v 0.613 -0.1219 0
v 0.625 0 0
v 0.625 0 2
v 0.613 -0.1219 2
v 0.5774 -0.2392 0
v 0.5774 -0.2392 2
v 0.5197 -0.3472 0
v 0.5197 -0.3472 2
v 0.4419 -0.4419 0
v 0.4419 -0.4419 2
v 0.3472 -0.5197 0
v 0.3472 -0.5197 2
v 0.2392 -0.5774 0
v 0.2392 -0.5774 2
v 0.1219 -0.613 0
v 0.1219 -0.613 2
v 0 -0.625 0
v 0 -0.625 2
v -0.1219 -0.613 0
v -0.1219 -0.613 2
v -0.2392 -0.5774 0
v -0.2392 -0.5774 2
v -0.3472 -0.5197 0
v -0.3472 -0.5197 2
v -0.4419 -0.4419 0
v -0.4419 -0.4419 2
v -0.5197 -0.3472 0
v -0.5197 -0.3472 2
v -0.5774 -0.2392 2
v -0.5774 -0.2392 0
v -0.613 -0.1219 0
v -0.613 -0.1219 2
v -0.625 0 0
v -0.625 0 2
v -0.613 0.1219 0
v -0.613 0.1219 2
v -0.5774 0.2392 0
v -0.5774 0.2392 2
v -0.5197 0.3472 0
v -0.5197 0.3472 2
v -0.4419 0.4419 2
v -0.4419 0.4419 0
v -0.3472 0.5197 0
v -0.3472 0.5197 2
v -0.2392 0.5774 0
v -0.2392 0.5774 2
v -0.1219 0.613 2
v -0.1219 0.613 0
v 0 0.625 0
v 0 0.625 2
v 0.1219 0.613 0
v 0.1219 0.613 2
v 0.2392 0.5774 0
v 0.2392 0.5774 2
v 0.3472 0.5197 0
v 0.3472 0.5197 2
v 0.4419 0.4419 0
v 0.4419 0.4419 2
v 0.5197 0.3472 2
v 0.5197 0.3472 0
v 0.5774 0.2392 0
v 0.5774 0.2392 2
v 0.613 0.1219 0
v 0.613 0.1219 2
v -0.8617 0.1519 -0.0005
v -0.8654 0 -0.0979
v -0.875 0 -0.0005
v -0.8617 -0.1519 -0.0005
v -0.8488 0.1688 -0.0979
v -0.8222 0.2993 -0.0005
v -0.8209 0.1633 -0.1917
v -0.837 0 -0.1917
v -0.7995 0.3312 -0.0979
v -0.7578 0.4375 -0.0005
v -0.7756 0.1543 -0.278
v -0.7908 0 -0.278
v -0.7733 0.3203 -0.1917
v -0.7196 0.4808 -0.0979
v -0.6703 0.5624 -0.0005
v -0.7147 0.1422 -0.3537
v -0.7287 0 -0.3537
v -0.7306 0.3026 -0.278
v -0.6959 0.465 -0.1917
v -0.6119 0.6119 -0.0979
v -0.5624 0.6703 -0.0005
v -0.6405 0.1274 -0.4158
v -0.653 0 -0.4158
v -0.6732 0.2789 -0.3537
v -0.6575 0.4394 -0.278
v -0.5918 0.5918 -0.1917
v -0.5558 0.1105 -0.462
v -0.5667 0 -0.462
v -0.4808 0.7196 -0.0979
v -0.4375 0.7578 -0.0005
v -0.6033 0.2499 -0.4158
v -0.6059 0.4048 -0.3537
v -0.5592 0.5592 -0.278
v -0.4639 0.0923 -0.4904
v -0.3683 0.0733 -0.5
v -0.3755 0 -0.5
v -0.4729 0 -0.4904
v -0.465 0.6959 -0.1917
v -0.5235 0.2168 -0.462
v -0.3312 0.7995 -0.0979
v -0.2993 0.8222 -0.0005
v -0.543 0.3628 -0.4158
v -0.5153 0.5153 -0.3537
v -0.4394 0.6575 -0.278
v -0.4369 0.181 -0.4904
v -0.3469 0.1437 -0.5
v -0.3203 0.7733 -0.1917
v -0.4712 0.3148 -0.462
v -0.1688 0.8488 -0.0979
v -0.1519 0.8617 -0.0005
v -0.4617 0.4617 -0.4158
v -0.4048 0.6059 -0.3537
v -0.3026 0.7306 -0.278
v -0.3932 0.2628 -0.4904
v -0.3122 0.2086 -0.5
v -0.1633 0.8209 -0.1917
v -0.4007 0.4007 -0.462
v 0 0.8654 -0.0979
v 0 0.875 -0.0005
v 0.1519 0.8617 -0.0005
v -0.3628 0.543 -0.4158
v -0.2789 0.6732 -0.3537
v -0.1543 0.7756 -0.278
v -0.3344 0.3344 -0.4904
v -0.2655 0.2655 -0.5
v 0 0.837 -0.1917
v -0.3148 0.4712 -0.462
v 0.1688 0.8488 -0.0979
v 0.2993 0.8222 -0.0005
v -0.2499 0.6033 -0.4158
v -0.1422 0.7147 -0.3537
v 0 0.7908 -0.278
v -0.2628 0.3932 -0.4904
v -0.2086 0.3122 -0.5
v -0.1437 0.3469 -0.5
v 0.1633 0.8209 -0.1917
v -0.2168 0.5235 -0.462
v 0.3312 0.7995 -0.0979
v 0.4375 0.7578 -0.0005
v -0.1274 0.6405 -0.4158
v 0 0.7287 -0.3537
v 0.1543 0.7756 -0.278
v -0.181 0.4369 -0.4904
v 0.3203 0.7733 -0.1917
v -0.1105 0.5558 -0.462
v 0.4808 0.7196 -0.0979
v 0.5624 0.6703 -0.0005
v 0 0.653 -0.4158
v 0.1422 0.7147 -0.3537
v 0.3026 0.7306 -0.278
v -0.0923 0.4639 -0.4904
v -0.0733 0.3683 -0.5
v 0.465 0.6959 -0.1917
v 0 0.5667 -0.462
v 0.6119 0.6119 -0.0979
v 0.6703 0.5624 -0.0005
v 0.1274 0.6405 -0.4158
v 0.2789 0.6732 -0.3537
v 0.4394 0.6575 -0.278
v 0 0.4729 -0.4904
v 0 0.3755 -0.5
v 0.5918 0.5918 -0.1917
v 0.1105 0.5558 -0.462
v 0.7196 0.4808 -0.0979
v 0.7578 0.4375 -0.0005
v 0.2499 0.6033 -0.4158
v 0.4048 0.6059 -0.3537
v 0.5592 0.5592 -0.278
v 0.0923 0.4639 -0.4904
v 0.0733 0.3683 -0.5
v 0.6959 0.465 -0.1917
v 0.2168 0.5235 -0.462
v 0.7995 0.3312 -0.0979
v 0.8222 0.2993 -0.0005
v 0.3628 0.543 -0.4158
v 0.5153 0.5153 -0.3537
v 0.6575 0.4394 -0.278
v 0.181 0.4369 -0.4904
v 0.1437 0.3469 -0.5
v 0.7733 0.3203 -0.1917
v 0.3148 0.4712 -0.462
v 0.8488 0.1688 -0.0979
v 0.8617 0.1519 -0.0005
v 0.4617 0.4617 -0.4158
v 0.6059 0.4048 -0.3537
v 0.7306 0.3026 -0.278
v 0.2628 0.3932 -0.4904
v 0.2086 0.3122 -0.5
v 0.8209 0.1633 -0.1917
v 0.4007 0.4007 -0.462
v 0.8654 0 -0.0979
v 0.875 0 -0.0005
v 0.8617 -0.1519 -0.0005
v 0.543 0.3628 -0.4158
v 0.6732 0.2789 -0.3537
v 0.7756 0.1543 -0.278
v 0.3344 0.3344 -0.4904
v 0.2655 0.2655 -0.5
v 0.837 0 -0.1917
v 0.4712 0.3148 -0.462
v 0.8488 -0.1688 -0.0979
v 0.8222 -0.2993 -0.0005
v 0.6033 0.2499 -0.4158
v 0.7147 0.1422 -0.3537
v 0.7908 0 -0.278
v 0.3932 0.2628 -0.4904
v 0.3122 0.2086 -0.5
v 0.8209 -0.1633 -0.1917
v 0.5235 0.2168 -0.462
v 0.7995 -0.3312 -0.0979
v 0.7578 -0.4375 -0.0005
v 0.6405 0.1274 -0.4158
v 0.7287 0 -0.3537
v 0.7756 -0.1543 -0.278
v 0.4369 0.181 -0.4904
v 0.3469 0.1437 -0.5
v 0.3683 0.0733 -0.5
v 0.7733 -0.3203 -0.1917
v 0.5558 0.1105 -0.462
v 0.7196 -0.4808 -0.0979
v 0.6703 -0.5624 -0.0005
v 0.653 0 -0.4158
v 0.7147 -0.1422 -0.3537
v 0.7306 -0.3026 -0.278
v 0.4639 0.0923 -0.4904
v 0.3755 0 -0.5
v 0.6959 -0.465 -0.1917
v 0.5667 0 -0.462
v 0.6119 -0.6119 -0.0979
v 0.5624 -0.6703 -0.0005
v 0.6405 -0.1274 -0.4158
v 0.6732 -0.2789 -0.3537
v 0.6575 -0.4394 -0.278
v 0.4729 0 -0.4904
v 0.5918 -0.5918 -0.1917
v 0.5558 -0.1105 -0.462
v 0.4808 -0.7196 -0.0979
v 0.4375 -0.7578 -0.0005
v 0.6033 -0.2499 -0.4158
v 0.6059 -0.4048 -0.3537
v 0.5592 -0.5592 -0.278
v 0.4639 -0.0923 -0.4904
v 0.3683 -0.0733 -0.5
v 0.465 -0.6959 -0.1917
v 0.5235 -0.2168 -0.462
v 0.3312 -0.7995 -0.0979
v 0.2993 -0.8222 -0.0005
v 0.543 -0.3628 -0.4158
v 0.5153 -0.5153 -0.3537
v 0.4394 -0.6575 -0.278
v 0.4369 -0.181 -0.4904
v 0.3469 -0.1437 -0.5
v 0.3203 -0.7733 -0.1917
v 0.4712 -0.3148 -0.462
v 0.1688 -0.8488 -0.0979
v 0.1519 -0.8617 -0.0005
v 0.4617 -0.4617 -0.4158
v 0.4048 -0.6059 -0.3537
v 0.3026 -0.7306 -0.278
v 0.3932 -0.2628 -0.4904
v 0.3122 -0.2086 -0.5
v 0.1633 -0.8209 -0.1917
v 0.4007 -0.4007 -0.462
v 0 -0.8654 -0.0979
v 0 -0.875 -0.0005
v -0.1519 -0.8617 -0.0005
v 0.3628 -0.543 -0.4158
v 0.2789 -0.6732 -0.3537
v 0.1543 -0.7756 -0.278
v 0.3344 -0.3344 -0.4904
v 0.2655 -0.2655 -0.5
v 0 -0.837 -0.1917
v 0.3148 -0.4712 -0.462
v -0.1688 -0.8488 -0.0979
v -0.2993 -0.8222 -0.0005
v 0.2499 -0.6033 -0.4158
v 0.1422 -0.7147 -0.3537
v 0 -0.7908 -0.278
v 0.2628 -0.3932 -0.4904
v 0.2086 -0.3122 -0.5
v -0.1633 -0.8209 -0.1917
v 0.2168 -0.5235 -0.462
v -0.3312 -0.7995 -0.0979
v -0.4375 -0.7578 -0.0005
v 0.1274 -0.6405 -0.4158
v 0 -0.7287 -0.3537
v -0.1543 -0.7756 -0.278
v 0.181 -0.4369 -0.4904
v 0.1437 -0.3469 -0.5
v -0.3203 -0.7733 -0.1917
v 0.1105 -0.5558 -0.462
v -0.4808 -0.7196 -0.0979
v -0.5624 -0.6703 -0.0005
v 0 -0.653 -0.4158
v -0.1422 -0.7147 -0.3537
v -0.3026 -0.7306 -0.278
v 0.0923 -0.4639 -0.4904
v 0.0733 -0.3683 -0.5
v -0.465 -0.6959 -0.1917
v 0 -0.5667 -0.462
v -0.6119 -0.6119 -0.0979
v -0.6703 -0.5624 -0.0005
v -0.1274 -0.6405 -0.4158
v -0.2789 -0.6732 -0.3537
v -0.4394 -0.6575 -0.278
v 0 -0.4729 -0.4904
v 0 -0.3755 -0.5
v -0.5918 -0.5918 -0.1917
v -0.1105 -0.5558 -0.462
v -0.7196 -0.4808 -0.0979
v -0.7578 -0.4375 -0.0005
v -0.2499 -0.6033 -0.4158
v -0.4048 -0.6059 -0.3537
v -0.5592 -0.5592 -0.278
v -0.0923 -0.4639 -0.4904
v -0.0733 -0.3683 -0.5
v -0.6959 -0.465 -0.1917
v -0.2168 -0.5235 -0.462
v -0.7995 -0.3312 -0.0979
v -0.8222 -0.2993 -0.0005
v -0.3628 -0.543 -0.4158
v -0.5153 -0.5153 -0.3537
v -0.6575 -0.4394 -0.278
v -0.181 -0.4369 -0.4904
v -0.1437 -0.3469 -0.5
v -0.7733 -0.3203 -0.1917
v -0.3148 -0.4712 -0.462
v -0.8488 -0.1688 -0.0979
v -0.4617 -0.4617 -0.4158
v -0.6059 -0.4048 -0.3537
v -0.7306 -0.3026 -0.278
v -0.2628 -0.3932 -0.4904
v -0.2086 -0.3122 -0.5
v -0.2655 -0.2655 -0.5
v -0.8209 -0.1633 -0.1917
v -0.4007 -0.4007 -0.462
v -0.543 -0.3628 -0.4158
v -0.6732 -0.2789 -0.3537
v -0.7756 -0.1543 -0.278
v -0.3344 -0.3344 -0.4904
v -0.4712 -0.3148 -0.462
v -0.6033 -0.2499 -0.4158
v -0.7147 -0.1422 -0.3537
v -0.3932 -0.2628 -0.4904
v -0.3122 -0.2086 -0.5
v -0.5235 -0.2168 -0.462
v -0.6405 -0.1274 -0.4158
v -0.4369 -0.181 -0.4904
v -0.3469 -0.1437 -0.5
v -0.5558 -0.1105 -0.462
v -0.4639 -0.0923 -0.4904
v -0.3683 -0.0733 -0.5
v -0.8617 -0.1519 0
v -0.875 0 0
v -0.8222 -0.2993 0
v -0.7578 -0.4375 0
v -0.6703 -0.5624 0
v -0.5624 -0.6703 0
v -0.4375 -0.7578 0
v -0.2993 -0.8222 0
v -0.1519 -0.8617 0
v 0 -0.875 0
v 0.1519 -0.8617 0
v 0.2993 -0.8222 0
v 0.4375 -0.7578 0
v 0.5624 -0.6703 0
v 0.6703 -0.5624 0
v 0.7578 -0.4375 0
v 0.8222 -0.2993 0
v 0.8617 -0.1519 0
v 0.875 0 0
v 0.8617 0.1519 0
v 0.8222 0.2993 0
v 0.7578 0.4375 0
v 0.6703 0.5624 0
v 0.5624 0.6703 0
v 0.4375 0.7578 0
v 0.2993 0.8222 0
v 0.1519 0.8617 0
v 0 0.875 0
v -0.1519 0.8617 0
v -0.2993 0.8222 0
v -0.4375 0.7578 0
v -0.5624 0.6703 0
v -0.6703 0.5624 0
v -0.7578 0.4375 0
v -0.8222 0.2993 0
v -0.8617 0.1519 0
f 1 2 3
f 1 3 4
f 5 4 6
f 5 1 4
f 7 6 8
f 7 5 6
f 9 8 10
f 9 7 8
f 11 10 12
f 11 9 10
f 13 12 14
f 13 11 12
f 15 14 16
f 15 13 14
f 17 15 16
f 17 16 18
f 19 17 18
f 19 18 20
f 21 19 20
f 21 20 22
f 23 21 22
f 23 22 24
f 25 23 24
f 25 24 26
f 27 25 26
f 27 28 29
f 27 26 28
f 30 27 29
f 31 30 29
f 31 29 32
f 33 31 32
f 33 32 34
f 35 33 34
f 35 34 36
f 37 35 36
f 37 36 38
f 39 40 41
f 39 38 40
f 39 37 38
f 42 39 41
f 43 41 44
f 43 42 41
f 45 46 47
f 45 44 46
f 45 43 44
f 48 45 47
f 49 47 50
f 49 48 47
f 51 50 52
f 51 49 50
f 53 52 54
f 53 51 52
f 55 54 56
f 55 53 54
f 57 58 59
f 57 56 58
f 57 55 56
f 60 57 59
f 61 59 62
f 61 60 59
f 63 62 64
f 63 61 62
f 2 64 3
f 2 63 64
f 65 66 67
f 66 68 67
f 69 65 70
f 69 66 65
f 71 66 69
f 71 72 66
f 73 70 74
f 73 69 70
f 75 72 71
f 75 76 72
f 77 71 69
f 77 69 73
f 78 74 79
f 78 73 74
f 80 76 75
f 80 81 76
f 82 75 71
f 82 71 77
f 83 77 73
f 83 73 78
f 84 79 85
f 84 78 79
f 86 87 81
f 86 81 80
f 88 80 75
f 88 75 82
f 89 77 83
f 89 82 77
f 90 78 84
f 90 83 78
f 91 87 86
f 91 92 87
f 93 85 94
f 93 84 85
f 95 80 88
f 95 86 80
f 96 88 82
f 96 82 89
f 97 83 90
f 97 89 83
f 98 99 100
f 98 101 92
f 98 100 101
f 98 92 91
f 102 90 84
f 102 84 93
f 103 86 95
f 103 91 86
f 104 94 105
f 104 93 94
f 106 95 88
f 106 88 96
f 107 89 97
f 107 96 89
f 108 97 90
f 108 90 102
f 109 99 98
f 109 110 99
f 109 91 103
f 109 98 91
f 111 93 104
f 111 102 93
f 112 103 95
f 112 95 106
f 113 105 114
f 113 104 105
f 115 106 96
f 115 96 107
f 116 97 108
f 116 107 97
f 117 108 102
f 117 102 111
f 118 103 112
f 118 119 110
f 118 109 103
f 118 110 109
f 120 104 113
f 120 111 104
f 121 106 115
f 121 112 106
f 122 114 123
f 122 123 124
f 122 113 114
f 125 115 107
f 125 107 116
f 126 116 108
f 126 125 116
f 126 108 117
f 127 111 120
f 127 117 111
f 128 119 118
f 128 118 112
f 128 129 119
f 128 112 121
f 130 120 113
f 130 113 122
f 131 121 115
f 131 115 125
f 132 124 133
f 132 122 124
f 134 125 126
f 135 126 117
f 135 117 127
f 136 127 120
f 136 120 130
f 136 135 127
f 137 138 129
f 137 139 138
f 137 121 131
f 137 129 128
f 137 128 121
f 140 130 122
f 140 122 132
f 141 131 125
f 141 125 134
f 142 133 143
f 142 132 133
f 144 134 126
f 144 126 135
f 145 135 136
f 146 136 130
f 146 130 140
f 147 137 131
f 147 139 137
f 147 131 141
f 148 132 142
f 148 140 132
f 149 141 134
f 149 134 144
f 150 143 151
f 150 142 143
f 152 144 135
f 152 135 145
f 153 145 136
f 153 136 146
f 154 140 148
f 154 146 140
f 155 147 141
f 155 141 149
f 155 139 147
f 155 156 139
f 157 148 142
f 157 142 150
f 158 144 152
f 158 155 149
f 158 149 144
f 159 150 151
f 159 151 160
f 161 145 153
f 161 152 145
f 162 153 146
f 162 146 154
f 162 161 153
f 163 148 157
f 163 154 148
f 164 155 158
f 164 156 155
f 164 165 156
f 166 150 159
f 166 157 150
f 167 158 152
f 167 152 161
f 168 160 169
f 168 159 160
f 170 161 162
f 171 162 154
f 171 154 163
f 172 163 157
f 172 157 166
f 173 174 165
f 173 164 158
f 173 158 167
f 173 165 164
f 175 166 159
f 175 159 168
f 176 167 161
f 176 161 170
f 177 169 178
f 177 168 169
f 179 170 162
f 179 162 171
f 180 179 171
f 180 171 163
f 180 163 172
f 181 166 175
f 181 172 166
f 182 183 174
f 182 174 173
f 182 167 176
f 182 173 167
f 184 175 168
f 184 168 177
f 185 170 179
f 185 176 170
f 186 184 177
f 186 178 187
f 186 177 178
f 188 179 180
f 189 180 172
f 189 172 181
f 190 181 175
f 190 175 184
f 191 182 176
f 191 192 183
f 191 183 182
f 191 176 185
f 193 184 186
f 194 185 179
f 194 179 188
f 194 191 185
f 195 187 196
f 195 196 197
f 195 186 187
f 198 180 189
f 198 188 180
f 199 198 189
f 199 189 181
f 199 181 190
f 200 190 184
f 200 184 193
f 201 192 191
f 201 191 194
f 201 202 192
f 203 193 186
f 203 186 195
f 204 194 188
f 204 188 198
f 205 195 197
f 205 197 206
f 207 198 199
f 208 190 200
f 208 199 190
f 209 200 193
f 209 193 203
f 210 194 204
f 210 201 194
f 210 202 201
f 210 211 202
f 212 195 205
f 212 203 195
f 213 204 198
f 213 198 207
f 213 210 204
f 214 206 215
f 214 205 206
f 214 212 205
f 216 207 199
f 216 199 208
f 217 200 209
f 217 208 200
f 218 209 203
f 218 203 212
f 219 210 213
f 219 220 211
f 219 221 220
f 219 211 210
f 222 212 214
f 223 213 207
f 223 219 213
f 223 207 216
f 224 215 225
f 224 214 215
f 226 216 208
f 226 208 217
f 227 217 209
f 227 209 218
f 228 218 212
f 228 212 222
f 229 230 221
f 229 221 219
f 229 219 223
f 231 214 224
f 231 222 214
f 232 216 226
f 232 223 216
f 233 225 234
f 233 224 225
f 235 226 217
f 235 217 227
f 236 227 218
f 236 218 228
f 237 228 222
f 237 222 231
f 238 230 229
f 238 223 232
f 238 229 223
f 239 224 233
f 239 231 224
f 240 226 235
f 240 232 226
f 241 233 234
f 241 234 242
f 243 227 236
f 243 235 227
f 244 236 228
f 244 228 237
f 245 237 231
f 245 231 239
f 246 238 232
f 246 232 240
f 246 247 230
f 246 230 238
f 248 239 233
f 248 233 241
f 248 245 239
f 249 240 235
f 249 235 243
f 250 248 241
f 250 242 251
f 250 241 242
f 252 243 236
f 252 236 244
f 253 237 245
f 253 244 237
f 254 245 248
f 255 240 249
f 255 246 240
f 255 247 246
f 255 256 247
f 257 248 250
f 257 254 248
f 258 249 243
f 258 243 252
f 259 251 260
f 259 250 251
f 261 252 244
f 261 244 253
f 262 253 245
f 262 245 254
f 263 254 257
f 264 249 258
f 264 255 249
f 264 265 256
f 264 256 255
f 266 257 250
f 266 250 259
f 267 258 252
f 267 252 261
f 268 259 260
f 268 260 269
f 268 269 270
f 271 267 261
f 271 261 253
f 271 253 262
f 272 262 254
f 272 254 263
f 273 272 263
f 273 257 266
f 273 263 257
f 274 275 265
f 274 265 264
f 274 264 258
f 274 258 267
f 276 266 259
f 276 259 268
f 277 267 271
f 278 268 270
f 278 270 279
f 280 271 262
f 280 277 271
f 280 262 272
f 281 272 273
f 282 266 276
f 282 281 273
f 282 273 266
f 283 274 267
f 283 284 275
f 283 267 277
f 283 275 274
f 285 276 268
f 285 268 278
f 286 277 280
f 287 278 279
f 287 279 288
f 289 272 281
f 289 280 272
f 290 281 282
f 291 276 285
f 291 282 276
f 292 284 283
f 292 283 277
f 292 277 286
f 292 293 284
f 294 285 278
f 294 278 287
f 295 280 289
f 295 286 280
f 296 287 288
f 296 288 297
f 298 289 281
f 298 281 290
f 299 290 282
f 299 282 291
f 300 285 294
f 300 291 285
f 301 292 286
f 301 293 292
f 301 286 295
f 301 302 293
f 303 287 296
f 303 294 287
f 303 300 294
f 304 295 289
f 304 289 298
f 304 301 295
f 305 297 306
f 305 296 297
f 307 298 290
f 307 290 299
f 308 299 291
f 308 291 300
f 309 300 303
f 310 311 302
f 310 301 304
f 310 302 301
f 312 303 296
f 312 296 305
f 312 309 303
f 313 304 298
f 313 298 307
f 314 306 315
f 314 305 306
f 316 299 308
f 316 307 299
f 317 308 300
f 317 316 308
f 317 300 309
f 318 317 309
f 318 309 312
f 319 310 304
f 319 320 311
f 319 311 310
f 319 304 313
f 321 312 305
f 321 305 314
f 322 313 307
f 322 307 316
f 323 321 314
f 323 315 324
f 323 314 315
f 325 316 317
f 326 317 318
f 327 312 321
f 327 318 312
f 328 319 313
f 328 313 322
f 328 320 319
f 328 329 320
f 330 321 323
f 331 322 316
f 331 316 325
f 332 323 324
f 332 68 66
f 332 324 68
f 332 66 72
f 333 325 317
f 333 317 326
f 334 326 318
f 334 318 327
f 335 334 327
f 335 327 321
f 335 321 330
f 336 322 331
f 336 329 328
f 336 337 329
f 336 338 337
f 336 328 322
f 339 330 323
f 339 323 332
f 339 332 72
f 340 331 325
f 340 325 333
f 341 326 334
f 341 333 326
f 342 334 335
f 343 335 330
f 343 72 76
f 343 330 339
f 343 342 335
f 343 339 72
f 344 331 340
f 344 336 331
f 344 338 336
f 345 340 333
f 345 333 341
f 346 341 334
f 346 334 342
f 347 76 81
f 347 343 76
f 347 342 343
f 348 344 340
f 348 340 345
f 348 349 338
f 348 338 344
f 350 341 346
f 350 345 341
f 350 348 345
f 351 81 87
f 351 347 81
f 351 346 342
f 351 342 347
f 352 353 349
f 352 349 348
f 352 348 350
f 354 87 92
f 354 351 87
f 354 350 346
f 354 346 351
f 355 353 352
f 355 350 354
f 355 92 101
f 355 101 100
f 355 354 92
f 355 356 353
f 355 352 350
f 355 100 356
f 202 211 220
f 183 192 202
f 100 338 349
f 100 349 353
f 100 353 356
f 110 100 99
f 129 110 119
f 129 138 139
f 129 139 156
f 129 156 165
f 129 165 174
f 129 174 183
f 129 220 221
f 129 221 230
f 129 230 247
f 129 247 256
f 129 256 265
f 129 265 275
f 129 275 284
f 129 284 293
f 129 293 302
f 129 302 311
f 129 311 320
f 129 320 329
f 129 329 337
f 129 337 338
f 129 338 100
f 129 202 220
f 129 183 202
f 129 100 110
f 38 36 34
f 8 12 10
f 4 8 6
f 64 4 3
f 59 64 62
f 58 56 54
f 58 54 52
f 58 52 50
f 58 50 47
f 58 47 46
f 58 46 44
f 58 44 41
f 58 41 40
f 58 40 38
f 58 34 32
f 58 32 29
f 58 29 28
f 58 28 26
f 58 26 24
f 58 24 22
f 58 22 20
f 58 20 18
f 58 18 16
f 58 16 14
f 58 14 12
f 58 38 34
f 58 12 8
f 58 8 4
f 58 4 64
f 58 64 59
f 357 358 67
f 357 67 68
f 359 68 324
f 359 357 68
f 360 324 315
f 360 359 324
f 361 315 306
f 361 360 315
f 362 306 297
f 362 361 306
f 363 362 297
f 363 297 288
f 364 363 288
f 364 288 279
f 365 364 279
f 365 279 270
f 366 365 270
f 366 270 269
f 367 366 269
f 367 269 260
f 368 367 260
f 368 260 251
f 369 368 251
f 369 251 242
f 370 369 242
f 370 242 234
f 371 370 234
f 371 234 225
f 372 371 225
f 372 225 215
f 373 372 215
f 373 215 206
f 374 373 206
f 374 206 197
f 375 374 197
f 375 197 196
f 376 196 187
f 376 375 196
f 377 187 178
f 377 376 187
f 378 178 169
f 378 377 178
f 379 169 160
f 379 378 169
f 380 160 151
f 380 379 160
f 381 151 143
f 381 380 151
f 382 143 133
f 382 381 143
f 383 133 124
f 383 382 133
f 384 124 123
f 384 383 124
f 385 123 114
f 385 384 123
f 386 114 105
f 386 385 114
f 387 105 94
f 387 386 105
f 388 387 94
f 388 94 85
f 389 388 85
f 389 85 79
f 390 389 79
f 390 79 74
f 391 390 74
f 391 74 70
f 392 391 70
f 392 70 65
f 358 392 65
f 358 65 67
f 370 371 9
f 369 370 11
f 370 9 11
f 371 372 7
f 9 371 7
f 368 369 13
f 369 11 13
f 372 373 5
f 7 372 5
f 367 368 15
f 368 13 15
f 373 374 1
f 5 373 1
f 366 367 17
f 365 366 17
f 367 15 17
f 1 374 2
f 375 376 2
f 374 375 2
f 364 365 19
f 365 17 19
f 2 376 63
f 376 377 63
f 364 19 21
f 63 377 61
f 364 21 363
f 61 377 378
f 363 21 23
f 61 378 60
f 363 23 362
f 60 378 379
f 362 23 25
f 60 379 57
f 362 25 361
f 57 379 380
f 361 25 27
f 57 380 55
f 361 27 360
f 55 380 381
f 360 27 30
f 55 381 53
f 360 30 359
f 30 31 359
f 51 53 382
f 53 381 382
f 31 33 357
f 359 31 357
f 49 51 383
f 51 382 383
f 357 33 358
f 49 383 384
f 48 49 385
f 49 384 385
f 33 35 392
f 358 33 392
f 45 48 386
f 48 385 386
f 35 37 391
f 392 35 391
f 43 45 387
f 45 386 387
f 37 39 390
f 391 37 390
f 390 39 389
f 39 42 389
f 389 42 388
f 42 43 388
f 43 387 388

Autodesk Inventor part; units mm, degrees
ref_plane "YZ Plane" through (0, 0, 0) normal (1, 0, 0) x (0, 1, 0)
ref_plane "XZ Plane" through (0, 0, 0) normal (0, 1, 0) x (-1, 0, 0)
ref_plane "XY Plane" through (0, 0, 0) normal (0, 0, 1) x (1, 0, 0)
sketch "Sketch1" plane through (0, 0, 0) normal (0, 0, 1) x (1, 0, 0)
  circle A0 centre (0, 0) radius 0.625
  circle A1 centre (0, 0) radius 0.75
  dimension "d0" = 1.25
  dimension "d3" = 1.5
extrude "Extrusion1" add sketch "Sketch1" along normal blind 2 contours A0
sketch "Sketch2" plane through (0, 0, 0) normal (0, 0, -1) x (-1, 0, 0)
  circle A0 centre (0, 0) radius 0.875
  dimension "d4" = 1.75
extrude "Extrusion2" add sketch "Sketch2" along normal blind 0.5
fillet "Fillet1" radius 0.5 1 edges at (0.875, 0, -0.5)
sketch "Sketch3" plane through (0, 0, 0) normal (1, 0, 0) x (0, 1, 0)
  point P0 (0, 0)
properties part number "surub ochelari" material "Iron, Cast"
